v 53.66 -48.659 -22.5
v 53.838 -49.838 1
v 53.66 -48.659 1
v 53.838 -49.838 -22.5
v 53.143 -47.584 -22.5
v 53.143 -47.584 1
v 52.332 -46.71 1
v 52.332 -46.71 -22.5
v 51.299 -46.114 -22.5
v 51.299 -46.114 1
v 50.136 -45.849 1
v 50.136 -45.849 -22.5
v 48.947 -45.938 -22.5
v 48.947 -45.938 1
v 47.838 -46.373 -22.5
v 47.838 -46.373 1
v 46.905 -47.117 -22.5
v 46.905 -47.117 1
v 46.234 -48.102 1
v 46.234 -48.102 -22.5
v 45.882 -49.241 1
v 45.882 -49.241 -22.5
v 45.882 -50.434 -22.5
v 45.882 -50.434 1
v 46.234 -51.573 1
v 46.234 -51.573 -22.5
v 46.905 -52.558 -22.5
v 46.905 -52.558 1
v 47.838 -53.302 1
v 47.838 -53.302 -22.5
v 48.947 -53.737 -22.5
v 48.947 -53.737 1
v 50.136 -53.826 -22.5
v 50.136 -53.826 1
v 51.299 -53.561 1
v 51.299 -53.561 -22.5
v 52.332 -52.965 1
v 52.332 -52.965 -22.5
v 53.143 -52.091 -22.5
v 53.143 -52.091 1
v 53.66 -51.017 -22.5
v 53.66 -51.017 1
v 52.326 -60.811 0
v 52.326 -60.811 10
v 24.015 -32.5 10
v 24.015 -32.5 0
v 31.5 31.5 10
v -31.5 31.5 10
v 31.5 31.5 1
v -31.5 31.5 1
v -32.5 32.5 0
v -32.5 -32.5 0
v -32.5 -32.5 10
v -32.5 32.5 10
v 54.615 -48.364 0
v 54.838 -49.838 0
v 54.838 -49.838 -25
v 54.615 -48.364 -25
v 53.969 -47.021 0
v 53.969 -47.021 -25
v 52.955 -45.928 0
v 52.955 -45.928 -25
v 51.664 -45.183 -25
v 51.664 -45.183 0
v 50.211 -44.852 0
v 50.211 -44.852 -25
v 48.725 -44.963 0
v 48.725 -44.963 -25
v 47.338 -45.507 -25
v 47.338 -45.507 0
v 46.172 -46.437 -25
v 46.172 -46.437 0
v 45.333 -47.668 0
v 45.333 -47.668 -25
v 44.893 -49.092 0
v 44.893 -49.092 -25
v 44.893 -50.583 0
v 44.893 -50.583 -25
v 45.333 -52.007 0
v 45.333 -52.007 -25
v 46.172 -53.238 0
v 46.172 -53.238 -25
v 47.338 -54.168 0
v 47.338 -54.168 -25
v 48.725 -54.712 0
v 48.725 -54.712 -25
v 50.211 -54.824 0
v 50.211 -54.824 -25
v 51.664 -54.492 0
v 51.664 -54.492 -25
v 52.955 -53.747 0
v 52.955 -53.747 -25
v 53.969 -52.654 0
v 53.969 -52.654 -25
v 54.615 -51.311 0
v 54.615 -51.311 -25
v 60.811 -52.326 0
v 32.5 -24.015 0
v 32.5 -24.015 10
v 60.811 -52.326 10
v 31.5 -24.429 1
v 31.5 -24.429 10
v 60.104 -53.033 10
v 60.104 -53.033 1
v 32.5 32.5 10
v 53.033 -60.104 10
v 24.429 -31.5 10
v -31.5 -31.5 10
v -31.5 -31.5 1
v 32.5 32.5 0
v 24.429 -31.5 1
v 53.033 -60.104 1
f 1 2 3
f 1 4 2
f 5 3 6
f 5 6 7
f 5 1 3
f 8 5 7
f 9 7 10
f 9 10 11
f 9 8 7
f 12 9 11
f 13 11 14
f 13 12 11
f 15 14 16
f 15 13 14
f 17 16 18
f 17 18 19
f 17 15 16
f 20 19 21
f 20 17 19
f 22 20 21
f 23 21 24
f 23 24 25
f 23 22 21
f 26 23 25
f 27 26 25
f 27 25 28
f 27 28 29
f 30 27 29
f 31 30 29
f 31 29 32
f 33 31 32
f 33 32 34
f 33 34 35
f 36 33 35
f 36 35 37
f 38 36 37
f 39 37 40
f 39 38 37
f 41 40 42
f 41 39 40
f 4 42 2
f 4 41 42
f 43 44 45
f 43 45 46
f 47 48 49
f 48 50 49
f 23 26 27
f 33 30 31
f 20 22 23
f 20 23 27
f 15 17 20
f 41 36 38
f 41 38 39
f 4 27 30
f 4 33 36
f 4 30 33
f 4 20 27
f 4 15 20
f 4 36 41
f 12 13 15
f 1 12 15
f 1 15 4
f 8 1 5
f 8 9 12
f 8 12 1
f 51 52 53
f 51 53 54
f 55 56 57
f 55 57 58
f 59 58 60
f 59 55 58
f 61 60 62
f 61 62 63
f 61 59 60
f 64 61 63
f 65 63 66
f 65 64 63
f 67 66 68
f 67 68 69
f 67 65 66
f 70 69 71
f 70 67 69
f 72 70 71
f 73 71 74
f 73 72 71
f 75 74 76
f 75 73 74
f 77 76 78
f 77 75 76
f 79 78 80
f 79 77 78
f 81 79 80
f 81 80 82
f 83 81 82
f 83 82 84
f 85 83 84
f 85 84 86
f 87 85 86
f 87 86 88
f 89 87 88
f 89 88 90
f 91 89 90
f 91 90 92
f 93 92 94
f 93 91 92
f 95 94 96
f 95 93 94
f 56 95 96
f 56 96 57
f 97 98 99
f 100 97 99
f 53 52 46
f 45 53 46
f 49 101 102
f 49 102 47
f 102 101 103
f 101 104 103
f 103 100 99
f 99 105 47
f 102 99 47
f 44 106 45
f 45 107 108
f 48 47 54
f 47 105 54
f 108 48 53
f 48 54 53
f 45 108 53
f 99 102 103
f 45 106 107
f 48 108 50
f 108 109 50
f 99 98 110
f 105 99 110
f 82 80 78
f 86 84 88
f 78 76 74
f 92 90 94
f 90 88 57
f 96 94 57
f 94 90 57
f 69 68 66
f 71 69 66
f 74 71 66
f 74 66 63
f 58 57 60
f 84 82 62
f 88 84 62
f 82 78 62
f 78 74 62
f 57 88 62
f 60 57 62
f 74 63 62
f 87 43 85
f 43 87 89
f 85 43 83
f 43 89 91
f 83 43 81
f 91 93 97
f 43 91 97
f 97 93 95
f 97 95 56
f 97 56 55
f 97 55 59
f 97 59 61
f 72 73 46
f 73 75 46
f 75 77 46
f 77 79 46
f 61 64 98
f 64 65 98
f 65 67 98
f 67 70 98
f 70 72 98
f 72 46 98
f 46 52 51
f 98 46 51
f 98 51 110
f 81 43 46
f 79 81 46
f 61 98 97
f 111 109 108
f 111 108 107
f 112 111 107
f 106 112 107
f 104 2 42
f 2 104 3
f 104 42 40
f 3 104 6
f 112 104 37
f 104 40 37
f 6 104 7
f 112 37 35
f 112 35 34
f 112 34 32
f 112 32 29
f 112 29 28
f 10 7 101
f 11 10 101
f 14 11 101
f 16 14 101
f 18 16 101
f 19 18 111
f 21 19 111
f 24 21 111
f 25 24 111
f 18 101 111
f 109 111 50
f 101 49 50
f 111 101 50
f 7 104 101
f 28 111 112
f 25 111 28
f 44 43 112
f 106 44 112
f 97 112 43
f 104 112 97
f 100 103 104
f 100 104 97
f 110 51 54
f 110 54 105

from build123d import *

# Parameters (mm, degrees)
F0_W           = 65
F0_H           = 65
F1_DEPTH       = 10
F2_T           = -1
F6_DEPTH       = 10.0380592229
F6_DEPTH_BACK  = 30
F8_DEPTH       = 64.9
F8_DEPTH_BACK  = 36.001
F9_R           = 5
F10_DEPTH      = 25
F10_DEPTH_BACK = 1
F11_R          = 4
F12_DEPTH      = 1
F12_DEPTH_BACK = 22.5


with BuildPart() as f1:
    # F0 (on Top) → F1 (new body)
    with BuildSketch(Plane.XY):
        Rectangle(F0_W, F0_H)
    extrude(amount=F1_DEPTH)

    # F2
    f2_openings = [f1.faces().sort_by_distance(p)[0] for p in [
        (0, 0, 10),
    ]]
    offset(amount=F2_T, openings=f2_openings)

    # F5 (on face) → F6 (join, two sides)
    with BuildSketch(Plane(origin=(35.3553390593, -35.3553390593, 0), x_dir=(0.7071067812, 0.7071067812, 0), z_dir=(0.7071067812, -0.7071067812, 0))) as f6_sk:
        Polygon((6, 10), (5, 10), (5, 1), (-5, 1), (-5, 10), (-6, 10), (-6, 0), (6, 0), align=None)
    extrude(amount=-F6_DEPTH)
    extrude(f6_sk.sketch, amount=F6_DEPTH_BACK)

    # F7 (on face) → F8 (cut, two sides)
    with BuildSketch(Plane(origin=(35.3553390593, -35.3553390593, 0), x_dir=(0.7071067812, 0.7071067812, 0), z_dir=(0.7071067812, -0.7071067812, 0))) as f8_sk:
        Polygon((0, 10), (-5, 10), (-5, 1), (5, 1), (5, 10), align=None)
    extrude(amount=-F8_DEPTH, mode=Mode.SUBTRACT)
    extrude(f8_sk.sketch, amount=F8_DEPTH_BACK, mode=Mode.SUBTRACT)

    # F9 (on Top) → F10 (join, two sides)
    with BuildSketch(Plane.XY) as f10_sk:
        with Locations((49.8375721066, -49.8375721066)):
            Circle(F9_R)
    extrude(amount=-F10_DEPTH)
    extrude(f10_sk.sketch, amount=F10_DEPTH_BACK)

    # F11 (on Top) → F12 (cut, two sides)
    with BuildSketch(Plane.XY) as f12_sk:
        with Locations((49.8375721066, -49.8375721066)):
            Circle(F11_R)
    extrude(amount=F12_DEPTH, mode=Mode.SUBTRACT)
    extrude(f12_sk.sketch, amount=-F12_DEPTH_BACK, mode=Mode.SUBTRACT)


solid = f1.part
